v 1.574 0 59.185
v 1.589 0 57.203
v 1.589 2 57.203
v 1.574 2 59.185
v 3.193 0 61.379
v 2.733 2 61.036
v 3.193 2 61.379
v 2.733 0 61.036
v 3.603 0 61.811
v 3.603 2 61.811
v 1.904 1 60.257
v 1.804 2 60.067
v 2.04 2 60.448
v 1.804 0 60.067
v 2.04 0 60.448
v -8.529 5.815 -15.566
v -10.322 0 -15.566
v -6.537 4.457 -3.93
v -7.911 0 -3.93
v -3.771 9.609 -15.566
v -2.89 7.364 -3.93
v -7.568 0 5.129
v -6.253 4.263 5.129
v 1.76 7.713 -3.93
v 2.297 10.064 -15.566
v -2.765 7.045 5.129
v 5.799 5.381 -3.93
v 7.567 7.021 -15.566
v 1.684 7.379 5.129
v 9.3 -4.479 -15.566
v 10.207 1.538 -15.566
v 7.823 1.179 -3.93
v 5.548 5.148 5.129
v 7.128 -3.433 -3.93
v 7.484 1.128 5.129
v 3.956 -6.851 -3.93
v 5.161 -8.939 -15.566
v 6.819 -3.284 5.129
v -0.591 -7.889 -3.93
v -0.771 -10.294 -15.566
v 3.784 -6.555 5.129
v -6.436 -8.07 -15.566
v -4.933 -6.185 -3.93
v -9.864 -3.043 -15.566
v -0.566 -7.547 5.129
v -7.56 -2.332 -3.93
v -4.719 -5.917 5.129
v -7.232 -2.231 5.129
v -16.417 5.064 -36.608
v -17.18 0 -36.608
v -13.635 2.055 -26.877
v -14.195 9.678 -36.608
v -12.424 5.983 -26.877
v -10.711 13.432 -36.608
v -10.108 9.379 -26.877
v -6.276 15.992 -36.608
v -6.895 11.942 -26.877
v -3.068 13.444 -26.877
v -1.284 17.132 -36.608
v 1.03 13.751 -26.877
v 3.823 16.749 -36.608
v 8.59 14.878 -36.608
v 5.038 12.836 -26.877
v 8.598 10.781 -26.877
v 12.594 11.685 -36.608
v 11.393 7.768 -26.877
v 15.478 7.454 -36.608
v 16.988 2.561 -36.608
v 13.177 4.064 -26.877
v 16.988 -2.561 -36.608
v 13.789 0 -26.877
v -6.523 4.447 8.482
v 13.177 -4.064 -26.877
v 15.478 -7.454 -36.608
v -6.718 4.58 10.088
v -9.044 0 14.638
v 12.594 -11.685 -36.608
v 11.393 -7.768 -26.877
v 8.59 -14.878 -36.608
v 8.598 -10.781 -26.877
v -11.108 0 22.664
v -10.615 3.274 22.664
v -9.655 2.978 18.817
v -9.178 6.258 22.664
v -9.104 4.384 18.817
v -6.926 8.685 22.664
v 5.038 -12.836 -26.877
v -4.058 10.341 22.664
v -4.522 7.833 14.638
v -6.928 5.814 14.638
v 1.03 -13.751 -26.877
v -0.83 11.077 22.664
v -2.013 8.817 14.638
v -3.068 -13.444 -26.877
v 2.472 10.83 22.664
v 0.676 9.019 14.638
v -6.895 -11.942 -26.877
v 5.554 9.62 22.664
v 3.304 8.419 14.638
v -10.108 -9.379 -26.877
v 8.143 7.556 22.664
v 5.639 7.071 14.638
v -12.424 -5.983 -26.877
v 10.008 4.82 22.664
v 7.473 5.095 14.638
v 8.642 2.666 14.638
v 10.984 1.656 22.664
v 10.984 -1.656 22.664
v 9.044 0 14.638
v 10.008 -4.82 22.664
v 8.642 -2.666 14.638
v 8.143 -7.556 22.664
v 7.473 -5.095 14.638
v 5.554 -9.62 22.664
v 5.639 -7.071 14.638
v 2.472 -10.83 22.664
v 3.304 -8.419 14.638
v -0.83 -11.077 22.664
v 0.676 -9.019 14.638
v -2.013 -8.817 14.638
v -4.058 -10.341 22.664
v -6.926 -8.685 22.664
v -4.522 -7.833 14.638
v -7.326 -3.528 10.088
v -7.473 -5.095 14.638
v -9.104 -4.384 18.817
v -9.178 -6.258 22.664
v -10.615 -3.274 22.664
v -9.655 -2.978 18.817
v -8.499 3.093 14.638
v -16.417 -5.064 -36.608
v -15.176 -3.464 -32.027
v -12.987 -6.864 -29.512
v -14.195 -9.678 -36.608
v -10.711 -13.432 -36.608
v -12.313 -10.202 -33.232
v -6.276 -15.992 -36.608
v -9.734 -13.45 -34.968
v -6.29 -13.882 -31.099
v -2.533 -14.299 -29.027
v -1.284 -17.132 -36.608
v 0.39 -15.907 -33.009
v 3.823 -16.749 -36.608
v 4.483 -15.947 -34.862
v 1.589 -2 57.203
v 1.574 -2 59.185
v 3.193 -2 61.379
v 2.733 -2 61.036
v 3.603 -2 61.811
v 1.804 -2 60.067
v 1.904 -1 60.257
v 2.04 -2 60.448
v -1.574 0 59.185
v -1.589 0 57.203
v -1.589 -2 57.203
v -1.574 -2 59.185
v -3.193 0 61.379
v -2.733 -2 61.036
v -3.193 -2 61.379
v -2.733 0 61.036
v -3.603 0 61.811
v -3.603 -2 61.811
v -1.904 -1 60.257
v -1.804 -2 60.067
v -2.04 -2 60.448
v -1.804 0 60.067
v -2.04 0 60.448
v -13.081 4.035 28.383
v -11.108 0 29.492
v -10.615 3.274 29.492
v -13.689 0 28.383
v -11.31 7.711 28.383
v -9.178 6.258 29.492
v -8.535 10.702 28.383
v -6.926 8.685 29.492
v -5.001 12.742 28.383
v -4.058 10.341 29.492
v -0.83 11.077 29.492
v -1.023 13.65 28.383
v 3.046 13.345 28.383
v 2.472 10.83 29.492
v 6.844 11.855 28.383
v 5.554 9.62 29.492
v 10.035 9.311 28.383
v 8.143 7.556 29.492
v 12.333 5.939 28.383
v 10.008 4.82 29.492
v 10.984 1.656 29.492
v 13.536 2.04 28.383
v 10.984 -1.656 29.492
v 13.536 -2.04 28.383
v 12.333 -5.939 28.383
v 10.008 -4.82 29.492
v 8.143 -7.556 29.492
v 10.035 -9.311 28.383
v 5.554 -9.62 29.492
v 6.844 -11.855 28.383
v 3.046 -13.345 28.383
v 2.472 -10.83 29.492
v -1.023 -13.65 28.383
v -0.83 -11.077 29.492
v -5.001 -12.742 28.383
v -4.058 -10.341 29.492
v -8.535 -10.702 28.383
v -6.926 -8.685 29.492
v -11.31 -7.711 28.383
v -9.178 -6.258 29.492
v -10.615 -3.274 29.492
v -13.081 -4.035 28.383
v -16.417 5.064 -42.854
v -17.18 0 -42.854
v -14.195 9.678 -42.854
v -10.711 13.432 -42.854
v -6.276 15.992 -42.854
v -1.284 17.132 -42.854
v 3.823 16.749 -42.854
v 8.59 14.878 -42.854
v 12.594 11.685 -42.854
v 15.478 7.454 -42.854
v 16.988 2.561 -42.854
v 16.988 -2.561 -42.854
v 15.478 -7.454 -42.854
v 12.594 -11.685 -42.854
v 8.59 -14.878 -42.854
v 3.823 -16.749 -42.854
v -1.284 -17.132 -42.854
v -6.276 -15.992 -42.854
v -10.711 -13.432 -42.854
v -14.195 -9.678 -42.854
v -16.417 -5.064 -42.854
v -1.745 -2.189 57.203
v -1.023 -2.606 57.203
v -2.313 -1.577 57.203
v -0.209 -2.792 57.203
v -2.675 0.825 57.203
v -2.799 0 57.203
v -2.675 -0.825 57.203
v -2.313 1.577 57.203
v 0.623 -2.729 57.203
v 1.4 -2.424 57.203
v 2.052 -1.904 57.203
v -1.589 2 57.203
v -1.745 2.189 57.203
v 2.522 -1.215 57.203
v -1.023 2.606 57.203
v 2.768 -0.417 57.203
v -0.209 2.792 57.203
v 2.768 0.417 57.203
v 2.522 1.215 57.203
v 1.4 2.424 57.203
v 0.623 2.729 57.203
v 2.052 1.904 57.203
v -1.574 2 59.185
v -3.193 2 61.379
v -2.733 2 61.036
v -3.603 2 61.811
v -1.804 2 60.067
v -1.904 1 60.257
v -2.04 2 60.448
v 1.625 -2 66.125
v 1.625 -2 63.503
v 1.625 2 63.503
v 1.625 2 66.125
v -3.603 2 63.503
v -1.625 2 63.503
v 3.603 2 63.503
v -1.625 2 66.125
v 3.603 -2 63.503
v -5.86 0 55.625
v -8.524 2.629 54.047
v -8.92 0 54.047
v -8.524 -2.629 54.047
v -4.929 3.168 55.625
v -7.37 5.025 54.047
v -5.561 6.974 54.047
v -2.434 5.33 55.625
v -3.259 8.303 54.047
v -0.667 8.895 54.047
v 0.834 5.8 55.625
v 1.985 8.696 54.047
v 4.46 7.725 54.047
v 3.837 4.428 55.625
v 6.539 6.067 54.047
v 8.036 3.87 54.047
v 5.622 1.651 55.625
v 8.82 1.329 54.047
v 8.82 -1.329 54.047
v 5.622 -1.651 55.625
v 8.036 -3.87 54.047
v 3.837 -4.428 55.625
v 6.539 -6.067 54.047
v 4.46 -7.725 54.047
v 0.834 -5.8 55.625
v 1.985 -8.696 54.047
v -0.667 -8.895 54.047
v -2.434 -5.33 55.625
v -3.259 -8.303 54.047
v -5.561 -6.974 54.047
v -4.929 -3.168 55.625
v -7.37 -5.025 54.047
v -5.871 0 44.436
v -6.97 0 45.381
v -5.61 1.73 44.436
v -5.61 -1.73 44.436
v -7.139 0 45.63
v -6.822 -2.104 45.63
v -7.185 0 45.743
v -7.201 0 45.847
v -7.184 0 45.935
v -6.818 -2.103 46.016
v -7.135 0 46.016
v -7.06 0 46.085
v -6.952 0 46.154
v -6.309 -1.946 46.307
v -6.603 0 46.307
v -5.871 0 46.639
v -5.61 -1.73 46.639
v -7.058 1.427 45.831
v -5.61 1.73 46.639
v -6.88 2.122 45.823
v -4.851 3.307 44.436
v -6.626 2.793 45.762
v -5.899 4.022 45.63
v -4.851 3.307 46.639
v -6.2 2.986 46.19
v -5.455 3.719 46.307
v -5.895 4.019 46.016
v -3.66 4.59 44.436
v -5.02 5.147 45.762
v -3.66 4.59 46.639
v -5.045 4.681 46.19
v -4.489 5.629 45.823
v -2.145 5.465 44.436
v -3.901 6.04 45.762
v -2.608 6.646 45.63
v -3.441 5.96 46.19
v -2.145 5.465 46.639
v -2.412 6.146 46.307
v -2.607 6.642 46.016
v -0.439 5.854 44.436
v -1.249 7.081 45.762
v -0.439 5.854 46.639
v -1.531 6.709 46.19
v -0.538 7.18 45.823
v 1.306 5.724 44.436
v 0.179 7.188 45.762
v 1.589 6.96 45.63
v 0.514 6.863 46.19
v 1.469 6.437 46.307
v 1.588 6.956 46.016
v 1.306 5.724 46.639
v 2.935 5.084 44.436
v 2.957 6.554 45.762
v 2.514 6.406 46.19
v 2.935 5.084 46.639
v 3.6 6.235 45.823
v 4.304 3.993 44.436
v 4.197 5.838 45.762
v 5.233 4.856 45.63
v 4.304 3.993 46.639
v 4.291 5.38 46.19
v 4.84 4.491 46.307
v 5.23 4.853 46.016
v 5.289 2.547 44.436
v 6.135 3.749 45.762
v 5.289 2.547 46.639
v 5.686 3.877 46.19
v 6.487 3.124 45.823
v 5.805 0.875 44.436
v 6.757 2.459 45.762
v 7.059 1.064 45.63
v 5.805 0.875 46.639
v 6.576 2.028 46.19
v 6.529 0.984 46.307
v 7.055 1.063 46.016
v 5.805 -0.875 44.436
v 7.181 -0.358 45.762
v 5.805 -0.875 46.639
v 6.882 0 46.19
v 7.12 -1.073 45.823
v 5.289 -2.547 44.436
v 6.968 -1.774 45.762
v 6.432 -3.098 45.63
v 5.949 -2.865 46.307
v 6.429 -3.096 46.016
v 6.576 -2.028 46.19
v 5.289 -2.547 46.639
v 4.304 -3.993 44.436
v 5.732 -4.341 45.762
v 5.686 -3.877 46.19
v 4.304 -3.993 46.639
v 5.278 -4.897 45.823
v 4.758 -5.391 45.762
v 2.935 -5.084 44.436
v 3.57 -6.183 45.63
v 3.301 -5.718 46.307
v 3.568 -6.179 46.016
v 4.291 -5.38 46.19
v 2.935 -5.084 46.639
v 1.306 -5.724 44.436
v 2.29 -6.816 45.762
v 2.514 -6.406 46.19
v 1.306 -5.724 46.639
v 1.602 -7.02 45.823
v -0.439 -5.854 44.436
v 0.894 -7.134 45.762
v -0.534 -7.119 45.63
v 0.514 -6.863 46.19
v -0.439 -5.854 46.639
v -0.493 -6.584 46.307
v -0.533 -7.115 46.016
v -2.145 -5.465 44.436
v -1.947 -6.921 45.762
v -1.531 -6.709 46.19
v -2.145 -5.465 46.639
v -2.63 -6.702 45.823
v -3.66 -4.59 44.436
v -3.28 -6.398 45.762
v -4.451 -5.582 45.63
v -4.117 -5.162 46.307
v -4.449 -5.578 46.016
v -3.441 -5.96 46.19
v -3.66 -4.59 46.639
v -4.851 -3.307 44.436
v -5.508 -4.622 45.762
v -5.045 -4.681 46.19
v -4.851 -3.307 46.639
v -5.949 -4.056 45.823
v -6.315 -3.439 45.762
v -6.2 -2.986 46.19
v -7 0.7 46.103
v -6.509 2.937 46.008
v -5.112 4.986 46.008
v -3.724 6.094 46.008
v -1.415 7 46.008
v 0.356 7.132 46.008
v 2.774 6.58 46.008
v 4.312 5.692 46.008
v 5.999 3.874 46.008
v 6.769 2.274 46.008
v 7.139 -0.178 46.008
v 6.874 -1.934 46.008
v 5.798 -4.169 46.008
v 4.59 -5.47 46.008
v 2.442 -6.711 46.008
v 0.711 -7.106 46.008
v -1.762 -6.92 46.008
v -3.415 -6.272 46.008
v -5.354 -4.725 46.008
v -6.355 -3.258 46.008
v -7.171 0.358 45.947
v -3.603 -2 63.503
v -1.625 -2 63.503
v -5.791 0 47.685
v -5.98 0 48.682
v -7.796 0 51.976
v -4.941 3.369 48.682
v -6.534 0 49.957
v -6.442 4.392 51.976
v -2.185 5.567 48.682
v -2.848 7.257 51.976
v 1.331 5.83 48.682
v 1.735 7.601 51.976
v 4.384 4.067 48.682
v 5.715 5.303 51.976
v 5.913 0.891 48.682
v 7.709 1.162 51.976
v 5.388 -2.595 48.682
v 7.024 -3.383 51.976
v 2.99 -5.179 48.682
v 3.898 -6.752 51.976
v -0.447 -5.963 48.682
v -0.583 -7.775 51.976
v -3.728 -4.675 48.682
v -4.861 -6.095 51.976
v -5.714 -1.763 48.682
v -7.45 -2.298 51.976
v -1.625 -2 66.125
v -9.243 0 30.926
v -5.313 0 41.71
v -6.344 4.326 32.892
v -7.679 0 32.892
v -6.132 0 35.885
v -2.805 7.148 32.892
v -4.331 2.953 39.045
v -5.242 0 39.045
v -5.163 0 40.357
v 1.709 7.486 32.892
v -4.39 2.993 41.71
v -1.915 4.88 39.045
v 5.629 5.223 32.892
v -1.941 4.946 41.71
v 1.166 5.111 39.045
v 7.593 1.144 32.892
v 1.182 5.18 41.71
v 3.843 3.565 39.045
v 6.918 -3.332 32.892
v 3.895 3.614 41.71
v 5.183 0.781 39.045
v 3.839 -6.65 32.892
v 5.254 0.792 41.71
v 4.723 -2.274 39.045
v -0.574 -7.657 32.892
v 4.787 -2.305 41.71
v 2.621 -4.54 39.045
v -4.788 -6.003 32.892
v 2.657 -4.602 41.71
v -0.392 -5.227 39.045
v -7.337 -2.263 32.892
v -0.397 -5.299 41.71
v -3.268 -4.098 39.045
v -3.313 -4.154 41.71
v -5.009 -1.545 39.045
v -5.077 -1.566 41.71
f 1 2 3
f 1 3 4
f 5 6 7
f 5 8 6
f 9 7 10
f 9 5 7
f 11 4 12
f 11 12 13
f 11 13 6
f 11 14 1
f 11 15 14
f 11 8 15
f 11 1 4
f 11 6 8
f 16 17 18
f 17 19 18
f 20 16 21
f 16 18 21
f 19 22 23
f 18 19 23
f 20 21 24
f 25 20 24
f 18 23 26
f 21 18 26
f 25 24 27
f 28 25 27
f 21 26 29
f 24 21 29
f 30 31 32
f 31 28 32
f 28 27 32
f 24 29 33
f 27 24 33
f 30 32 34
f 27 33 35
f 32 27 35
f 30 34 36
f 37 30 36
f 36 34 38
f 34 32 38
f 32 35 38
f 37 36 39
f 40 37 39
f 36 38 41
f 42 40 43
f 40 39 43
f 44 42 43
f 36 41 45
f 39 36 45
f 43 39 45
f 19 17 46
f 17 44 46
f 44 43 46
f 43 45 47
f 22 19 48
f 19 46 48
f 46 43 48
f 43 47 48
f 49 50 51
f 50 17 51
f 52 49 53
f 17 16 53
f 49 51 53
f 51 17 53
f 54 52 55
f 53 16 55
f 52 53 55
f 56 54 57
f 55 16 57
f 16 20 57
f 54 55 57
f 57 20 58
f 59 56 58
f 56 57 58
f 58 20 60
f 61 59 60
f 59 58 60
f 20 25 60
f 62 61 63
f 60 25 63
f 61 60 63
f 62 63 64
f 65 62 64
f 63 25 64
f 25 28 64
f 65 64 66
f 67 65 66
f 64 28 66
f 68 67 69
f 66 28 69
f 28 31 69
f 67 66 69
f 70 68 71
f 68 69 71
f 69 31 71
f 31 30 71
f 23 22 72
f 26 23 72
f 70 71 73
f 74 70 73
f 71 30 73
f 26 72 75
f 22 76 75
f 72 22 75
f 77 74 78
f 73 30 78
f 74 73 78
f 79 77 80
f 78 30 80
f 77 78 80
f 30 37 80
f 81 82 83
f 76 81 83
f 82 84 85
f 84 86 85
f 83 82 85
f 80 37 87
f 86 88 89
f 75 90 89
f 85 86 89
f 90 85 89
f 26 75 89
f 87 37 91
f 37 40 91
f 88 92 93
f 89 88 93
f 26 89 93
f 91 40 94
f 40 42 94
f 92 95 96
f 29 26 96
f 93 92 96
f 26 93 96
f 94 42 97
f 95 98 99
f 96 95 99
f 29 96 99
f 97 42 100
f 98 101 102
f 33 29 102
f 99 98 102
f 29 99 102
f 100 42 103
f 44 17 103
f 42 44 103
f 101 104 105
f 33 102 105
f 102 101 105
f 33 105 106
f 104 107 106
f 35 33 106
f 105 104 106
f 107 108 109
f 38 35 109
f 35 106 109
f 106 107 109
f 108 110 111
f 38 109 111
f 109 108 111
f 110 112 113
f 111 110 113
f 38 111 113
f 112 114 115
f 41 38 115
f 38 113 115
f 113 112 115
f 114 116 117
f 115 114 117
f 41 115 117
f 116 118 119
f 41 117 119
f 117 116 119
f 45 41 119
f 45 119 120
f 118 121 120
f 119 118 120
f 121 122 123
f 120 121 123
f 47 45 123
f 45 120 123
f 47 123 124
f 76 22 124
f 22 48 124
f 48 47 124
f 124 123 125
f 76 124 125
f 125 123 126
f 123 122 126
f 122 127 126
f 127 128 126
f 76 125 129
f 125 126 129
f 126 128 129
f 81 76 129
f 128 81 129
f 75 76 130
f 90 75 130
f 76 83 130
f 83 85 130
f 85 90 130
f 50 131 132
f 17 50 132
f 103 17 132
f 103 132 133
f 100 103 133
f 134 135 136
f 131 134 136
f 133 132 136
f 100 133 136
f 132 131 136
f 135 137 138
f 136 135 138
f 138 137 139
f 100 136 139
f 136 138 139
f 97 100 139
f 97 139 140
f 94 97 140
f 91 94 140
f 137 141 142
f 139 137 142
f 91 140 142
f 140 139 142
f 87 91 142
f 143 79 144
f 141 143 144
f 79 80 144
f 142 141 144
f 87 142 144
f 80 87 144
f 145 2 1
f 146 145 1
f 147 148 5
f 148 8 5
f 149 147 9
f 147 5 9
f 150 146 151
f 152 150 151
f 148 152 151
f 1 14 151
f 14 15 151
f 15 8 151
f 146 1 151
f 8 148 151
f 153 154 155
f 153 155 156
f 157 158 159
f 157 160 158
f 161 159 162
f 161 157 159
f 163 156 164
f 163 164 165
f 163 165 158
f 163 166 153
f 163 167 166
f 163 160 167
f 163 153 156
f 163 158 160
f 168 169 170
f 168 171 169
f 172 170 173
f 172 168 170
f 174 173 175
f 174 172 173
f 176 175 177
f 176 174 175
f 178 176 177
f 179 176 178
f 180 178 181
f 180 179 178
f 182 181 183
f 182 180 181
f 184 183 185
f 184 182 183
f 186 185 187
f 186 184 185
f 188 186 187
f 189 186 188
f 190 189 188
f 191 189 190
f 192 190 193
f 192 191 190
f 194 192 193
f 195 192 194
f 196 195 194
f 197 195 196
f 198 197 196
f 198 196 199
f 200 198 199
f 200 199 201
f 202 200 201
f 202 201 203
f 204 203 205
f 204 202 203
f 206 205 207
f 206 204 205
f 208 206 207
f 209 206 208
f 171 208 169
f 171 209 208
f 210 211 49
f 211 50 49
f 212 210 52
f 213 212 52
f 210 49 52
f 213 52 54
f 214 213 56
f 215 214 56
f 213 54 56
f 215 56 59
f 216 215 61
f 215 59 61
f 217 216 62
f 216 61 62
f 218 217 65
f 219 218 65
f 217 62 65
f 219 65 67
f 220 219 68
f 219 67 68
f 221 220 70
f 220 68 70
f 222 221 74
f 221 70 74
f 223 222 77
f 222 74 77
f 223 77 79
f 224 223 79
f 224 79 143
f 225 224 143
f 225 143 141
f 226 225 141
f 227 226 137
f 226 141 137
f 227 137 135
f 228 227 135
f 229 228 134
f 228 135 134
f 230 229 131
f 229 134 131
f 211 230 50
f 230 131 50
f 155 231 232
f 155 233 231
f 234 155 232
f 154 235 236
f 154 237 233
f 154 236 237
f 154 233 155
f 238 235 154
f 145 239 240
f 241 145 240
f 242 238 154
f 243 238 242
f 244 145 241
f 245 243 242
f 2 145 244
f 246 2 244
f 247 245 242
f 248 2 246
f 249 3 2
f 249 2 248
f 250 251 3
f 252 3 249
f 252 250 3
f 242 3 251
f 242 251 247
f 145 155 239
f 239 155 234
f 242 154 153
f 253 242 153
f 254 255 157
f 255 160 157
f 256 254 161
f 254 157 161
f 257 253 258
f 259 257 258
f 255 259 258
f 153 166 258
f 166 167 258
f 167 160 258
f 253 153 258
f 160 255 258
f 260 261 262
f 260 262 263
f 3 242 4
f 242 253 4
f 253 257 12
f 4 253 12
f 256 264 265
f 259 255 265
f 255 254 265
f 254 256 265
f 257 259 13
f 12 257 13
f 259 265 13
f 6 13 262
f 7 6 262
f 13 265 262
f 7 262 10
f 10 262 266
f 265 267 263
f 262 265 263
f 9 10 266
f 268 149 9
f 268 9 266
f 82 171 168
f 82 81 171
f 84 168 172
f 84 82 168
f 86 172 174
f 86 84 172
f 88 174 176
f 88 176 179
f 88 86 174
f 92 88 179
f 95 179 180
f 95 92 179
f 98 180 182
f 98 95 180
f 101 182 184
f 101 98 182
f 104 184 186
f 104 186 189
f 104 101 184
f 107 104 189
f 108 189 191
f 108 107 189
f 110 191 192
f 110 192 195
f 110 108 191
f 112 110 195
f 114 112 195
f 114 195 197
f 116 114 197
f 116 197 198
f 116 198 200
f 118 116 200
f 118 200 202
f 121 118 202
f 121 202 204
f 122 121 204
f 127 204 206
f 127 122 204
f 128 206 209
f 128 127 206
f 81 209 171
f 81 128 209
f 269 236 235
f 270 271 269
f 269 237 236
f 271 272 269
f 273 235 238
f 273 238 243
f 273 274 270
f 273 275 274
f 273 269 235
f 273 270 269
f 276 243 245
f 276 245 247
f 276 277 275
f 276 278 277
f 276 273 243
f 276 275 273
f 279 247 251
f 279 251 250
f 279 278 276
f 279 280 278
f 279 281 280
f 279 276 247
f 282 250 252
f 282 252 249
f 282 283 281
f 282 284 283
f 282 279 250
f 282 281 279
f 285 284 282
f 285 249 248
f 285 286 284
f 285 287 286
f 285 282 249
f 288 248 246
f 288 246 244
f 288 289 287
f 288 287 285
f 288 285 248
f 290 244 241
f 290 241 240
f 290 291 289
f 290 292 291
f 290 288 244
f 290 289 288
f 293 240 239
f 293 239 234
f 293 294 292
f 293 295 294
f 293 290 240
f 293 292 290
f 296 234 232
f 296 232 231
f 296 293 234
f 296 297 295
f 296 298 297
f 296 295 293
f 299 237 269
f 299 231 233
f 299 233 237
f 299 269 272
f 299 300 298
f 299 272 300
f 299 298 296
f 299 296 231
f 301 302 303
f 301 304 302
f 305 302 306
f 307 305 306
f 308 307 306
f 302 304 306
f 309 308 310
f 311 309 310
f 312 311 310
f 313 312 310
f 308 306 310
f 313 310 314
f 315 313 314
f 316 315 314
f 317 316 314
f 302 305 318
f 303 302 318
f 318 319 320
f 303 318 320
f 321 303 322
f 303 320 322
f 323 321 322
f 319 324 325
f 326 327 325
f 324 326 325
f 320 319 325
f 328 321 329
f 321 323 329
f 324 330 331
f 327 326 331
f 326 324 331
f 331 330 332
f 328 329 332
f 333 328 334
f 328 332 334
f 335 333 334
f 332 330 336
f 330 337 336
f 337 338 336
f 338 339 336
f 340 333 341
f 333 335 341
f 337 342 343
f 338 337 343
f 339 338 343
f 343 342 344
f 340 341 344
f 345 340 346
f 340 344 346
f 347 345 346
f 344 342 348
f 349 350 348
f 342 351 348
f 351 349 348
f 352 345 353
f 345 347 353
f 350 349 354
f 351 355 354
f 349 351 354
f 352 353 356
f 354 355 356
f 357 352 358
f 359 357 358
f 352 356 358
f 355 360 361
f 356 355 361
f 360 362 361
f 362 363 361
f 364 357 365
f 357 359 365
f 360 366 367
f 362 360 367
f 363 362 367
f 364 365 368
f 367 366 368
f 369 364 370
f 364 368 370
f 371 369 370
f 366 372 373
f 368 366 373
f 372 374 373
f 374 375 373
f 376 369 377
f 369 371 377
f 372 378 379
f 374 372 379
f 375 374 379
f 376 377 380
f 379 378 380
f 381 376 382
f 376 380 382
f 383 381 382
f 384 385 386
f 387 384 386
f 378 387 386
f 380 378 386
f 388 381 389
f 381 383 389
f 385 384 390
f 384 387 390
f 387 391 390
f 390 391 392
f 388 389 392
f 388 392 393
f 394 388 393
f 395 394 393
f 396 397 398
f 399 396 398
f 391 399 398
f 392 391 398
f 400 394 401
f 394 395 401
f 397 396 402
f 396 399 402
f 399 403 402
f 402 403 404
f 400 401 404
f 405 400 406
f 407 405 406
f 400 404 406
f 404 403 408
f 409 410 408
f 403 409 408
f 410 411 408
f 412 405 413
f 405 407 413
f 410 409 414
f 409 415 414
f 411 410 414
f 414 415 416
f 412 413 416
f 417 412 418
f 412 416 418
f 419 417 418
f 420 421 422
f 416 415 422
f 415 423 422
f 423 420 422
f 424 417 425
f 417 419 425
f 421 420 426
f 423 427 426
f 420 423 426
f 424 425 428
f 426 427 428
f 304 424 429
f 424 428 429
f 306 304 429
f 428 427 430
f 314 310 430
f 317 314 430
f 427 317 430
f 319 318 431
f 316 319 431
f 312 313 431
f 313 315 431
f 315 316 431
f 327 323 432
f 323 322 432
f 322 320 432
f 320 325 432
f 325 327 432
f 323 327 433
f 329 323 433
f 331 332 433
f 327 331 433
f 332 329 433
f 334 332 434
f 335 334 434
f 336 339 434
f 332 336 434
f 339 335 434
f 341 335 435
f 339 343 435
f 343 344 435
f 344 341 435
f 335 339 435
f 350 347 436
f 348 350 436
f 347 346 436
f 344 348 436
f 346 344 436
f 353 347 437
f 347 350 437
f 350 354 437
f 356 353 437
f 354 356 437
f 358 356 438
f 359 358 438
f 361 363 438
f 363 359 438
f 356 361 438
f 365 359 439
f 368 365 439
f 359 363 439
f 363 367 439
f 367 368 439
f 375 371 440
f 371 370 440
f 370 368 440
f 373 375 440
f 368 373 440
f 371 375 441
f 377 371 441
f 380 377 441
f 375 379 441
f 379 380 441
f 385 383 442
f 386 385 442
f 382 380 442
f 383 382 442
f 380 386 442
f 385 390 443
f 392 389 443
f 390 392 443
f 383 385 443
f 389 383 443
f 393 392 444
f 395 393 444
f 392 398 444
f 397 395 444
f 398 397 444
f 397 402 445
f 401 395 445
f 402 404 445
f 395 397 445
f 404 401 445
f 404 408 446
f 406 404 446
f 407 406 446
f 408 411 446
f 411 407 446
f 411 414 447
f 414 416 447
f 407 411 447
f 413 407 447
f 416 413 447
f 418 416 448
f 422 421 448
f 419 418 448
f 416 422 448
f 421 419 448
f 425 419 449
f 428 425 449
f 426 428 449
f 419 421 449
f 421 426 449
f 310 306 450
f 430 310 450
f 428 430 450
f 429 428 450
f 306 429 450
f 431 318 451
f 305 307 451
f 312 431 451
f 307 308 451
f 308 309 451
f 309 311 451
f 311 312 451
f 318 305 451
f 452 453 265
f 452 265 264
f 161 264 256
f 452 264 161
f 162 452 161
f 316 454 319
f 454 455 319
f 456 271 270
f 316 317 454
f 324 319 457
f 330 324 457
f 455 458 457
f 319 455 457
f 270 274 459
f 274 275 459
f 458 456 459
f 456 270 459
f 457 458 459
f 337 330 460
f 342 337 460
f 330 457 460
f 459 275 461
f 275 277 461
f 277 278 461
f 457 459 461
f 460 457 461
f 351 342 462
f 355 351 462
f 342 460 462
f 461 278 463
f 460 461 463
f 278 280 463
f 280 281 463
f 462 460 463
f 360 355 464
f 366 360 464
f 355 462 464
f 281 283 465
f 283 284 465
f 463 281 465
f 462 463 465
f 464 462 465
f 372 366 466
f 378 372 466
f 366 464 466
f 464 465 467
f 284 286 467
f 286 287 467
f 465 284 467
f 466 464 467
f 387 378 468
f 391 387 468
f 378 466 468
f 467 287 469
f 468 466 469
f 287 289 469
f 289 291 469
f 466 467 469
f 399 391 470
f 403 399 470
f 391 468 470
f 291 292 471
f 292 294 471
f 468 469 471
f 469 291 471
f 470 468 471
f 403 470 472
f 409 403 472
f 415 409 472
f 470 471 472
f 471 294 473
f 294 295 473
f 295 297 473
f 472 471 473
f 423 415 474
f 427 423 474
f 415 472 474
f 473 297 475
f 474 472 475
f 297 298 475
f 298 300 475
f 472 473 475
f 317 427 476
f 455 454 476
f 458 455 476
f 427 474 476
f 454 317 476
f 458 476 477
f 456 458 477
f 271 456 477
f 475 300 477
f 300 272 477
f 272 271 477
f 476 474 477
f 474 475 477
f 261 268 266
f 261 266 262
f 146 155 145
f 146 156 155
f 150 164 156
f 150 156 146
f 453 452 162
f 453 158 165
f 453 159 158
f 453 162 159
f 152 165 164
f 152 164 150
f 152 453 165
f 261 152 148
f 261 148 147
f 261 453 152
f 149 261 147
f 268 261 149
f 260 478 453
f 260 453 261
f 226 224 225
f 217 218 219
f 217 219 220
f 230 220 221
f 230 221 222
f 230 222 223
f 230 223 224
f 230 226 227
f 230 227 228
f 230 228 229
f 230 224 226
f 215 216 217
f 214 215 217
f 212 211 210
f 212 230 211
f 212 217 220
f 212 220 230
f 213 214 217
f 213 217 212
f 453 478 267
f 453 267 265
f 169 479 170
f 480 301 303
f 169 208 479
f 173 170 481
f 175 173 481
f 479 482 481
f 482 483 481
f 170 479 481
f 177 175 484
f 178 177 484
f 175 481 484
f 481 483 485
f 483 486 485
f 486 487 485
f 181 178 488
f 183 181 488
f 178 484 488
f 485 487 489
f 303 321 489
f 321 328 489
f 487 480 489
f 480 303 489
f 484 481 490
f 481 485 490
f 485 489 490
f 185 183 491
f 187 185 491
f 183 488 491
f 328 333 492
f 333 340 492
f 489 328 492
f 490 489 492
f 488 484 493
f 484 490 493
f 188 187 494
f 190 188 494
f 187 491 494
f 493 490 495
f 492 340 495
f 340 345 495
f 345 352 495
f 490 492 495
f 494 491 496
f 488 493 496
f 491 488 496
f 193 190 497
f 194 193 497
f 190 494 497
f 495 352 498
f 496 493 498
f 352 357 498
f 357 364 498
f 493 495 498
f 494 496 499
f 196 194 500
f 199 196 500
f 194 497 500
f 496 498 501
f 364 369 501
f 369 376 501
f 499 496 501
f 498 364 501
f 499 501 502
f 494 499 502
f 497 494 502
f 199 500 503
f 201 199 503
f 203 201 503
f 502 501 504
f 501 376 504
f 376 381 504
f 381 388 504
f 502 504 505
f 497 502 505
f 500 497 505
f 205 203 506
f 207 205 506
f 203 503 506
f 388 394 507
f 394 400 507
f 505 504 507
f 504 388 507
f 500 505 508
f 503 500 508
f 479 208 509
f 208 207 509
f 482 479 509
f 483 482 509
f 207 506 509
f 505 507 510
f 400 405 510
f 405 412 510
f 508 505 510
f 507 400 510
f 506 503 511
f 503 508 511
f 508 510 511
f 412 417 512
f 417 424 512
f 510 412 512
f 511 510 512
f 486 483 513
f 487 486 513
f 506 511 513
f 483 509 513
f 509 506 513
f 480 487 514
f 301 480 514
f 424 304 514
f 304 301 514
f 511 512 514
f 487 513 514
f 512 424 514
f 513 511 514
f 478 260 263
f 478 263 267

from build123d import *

# Parameters (mm, degrees)
F0_W     = 17.1797536314
F0_H     = 6.2460470638
F2_DEPTH = 2


with BuildPart() as f1:
    # F0 (on Front) → F1 (revolve)
    with BuildSketch(Plane.XZ):
        with Locations((-8.5898768157, -39.7314429283)):
            Rectangle(F0_W, F0_H)
        with BuildLine():
            add(Edge.make_bspline(
                [(-17.1797536314, -36.6084193964), (-13.8412130362, -27.0733219531), (-3.7655602714, -0.1039771833), (-9.60948889, 16.5696096292), (-11.1084822565, 22.6635169238)],
                knots=[0, 0, 0, 0, 0.5622745719, 1, 1, 1, 1], degree=3))
            Line((-17.1797536314, -36.6084193964), (0, -36.6084193964))
            Line((0, -36.6084193964), (0, 57.2025813162))
            Line((0, 57.2025813162), (-1.5886335168, 57.2025813162))
            Line((-1.5886335168, 57.2025813162), (-2.7994840118, 57.2025813162))
            Line((-2.7994840118, 57.2025813162), (-8.9197969064, 54.0465675294))
            add(Edge.make_bspline(
                [(-5.8707841672, 46.6392822564), (-5.2688373253, 49.3856109679), (-7.9407452916, 51.5203798811), (-8.9197969064, 54.0465675294)],
                knots=[0, 0, 0, 0, 8.0102655262, 8.0102655262, 8.0102655262, 8.0102655262], degree=3))
            add(Edge.make_bspline(
                [(-5.8707841672, 44.4355420768), (-6.4785506158, 44.8487001919), (-7.9604304678, 46.1172039826), (-6.4081557233, 46.3077279426), (-5.8707841672, 46.6392822564)],
                knots=[0, 0, 0, 0, 0.5323422757, 1, 1, 1, 1], degree=3))
            add(Edge.make_bspline(
                [(-11.1084822565, 29.491815716), (-7.8871886606, 31.232032236), (-4.125628446, 39.4230942254), (-5.5170923569, 42.2844330979), (-5.8707841672, 44.4355420768)],
                knots=[0, 0, 0, 0, 0.5894302475, 1, 1, 1, 1], degree=3))
            Line((-11.1084822565, 29.491815716), (-13.6886807159, 28.3834971488))
            Line((-13.6886807159, 28.3834971488), (-11.1084822565, 22.6635169238))
        make_face()
    revolve(axis=Axis((0, 0, 4.9645396212), (0, 0, -1)))

    # F0 (on Front) → F2 (join, symmetric)
    with BuildSketch(Plane.XZ):
        with BuildLine():
            Line((-1.5886335168, 57.2025813162), (0, 57.2025813162))
            Line((0, 57.2025813162), (0, 66.1251172423))
            Line((0, 66.1251172423), (-1.62465428, 66.1251172423))
            Line((-1.62465428, 66.1251172423), (-1.62465428, 63.5033920407))
            Line((-1.62465428, 63.5033920407), (-3.6026129965, 63.5033920407))
            Line((-3.6026129965, 63.5033920407), (-3.6026129965, 61.8110969663))
            add(Edge.make_bspline(
                [(-1.5886335168, 57.2025813162), (-1.498904641, 58.1154281999), (-1.381835571, 60.6809226763), (-3.1117708882, 61.128619796), (-3.6026129965, 61.8110969663)],
                knots=[0, 0, 0, 0, 0.5359349994, 1, 1, 1, 1], degree=3))
        make_face()
        with BuildLine():
            Line((0, 66.1251172423), (0, 57.2025813162))
            Line((0, 57.2025813162), (1.5886335168, 57.2025813162))
            add(Edge.make_bspline(
                [(1.5886335168, 57.2025813162), (1.498904641, 58.1154281999), (1.381835571, 60.6809226763), (3.1117708882, 61.128619796), (3.6026129965, 61.8110969663)],
                knots=[0, 0, 0, 0, 0.5359349994, 1, 1, 1, 1], degree=3))
            Line((3.6026129965, 61.8110969663), (3.6026129965, 63.5033920407))
            Line((3.6026129965, 63.5033920407), (1.62465428, 63.5033920407))
            Line((1.62465428, 63.5033920407), (1.62465428, 66.1251172423))
            Line((1.62465428, 66.1251172423), (0, 66.1251172423))
        make_face()
    extrude(amount=F2_DEPTH, both=True)


solid = f1.part
